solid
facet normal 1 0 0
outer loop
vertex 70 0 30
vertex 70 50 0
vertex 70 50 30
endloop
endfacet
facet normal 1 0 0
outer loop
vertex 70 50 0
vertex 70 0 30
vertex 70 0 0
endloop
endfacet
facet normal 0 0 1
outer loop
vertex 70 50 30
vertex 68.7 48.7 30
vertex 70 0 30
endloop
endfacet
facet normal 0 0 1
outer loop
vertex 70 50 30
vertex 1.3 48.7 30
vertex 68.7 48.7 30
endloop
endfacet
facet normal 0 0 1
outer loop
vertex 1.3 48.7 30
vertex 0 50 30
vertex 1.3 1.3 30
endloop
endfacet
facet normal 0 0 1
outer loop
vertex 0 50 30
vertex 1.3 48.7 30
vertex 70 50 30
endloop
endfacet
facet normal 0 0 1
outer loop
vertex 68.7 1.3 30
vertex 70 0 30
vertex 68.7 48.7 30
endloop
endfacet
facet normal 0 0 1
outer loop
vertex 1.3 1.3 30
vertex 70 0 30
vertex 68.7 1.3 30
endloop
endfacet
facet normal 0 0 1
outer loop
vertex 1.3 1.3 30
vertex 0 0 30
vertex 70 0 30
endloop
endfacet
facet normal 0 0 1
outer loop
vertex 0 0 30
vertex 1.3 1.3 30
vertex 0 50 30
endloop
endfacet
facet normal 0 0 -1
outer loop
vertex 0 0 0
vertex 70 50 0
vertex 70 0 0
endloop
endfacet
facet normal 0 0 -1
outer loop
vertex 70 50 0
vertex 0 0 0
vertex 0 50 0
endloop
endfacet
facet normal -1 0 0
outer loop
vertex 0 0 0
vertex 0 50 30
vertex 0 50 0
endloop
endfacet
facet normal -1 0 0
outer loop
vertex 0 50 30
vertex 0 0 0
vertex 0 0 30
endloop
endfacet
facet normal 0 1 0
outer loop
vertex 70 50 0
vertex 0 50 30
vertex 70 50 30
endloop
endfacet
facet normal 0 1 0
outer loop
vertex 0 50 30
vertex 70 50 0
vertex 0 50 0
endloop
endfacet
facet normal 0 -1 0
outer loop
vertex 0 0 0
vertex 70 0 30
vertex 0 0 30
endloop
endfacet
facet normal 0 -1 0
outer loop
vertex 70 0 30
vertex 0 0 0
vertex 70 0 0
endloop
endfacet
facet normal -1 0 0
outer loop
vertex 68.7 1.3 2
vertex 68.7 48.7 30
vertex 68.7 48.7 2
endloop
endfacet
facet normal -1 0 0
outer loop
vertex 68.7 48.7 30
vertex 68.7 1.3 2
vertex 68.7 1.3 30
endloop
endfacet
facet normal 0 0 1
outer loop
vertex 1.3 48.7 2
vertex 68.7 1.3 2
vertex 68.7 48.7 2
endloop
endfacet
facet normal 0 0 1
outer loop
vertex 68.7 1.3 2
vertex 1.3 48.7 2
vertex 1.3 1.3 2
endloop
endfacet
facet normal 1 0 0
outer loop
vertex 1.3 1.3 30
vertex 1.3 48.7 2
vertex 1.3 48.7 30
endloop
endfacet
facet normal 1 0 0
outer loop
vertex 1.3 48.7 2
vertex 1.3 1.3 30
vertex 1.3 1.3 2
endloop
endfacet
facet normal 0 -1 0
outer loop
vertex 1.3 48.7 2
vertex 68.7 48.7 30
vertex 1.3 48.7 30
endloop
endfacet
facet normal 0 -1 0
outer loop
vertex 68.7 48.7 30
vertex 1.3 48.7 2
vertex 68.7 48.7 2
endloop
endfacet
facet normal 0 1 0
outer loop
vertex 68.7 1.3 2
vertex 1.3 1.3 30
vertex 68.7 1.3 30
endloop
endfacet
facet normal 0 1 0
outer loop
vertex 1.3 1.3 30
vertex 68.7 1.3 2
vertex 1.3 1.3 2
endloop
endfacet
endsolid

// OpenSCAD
$fn = 32;

// ----------------------------------------------------------------------
// Open box: 1.3 mm walls
// ----------------------------------------------------------------------

// --- parameters (mm) ---
box_l = 70;               // outer length, X
box_w = 50;               // outer width, Y
box_h = 30;               // outer height, Z
wall = 1.3;               // wall thickness
floor = 2;                // floor thickness
fit_tol = 0.05;           // tolerance for press fits, mm
free_tol = 0.2;           // tolerance for clearance fits, mm

difference() {
  cube([box_l, box_w, box_h]);
  translate([wall, wall, floor])
    cube([box_l - 2 * wall, box_w - 2 * wall, box_h]);
}
